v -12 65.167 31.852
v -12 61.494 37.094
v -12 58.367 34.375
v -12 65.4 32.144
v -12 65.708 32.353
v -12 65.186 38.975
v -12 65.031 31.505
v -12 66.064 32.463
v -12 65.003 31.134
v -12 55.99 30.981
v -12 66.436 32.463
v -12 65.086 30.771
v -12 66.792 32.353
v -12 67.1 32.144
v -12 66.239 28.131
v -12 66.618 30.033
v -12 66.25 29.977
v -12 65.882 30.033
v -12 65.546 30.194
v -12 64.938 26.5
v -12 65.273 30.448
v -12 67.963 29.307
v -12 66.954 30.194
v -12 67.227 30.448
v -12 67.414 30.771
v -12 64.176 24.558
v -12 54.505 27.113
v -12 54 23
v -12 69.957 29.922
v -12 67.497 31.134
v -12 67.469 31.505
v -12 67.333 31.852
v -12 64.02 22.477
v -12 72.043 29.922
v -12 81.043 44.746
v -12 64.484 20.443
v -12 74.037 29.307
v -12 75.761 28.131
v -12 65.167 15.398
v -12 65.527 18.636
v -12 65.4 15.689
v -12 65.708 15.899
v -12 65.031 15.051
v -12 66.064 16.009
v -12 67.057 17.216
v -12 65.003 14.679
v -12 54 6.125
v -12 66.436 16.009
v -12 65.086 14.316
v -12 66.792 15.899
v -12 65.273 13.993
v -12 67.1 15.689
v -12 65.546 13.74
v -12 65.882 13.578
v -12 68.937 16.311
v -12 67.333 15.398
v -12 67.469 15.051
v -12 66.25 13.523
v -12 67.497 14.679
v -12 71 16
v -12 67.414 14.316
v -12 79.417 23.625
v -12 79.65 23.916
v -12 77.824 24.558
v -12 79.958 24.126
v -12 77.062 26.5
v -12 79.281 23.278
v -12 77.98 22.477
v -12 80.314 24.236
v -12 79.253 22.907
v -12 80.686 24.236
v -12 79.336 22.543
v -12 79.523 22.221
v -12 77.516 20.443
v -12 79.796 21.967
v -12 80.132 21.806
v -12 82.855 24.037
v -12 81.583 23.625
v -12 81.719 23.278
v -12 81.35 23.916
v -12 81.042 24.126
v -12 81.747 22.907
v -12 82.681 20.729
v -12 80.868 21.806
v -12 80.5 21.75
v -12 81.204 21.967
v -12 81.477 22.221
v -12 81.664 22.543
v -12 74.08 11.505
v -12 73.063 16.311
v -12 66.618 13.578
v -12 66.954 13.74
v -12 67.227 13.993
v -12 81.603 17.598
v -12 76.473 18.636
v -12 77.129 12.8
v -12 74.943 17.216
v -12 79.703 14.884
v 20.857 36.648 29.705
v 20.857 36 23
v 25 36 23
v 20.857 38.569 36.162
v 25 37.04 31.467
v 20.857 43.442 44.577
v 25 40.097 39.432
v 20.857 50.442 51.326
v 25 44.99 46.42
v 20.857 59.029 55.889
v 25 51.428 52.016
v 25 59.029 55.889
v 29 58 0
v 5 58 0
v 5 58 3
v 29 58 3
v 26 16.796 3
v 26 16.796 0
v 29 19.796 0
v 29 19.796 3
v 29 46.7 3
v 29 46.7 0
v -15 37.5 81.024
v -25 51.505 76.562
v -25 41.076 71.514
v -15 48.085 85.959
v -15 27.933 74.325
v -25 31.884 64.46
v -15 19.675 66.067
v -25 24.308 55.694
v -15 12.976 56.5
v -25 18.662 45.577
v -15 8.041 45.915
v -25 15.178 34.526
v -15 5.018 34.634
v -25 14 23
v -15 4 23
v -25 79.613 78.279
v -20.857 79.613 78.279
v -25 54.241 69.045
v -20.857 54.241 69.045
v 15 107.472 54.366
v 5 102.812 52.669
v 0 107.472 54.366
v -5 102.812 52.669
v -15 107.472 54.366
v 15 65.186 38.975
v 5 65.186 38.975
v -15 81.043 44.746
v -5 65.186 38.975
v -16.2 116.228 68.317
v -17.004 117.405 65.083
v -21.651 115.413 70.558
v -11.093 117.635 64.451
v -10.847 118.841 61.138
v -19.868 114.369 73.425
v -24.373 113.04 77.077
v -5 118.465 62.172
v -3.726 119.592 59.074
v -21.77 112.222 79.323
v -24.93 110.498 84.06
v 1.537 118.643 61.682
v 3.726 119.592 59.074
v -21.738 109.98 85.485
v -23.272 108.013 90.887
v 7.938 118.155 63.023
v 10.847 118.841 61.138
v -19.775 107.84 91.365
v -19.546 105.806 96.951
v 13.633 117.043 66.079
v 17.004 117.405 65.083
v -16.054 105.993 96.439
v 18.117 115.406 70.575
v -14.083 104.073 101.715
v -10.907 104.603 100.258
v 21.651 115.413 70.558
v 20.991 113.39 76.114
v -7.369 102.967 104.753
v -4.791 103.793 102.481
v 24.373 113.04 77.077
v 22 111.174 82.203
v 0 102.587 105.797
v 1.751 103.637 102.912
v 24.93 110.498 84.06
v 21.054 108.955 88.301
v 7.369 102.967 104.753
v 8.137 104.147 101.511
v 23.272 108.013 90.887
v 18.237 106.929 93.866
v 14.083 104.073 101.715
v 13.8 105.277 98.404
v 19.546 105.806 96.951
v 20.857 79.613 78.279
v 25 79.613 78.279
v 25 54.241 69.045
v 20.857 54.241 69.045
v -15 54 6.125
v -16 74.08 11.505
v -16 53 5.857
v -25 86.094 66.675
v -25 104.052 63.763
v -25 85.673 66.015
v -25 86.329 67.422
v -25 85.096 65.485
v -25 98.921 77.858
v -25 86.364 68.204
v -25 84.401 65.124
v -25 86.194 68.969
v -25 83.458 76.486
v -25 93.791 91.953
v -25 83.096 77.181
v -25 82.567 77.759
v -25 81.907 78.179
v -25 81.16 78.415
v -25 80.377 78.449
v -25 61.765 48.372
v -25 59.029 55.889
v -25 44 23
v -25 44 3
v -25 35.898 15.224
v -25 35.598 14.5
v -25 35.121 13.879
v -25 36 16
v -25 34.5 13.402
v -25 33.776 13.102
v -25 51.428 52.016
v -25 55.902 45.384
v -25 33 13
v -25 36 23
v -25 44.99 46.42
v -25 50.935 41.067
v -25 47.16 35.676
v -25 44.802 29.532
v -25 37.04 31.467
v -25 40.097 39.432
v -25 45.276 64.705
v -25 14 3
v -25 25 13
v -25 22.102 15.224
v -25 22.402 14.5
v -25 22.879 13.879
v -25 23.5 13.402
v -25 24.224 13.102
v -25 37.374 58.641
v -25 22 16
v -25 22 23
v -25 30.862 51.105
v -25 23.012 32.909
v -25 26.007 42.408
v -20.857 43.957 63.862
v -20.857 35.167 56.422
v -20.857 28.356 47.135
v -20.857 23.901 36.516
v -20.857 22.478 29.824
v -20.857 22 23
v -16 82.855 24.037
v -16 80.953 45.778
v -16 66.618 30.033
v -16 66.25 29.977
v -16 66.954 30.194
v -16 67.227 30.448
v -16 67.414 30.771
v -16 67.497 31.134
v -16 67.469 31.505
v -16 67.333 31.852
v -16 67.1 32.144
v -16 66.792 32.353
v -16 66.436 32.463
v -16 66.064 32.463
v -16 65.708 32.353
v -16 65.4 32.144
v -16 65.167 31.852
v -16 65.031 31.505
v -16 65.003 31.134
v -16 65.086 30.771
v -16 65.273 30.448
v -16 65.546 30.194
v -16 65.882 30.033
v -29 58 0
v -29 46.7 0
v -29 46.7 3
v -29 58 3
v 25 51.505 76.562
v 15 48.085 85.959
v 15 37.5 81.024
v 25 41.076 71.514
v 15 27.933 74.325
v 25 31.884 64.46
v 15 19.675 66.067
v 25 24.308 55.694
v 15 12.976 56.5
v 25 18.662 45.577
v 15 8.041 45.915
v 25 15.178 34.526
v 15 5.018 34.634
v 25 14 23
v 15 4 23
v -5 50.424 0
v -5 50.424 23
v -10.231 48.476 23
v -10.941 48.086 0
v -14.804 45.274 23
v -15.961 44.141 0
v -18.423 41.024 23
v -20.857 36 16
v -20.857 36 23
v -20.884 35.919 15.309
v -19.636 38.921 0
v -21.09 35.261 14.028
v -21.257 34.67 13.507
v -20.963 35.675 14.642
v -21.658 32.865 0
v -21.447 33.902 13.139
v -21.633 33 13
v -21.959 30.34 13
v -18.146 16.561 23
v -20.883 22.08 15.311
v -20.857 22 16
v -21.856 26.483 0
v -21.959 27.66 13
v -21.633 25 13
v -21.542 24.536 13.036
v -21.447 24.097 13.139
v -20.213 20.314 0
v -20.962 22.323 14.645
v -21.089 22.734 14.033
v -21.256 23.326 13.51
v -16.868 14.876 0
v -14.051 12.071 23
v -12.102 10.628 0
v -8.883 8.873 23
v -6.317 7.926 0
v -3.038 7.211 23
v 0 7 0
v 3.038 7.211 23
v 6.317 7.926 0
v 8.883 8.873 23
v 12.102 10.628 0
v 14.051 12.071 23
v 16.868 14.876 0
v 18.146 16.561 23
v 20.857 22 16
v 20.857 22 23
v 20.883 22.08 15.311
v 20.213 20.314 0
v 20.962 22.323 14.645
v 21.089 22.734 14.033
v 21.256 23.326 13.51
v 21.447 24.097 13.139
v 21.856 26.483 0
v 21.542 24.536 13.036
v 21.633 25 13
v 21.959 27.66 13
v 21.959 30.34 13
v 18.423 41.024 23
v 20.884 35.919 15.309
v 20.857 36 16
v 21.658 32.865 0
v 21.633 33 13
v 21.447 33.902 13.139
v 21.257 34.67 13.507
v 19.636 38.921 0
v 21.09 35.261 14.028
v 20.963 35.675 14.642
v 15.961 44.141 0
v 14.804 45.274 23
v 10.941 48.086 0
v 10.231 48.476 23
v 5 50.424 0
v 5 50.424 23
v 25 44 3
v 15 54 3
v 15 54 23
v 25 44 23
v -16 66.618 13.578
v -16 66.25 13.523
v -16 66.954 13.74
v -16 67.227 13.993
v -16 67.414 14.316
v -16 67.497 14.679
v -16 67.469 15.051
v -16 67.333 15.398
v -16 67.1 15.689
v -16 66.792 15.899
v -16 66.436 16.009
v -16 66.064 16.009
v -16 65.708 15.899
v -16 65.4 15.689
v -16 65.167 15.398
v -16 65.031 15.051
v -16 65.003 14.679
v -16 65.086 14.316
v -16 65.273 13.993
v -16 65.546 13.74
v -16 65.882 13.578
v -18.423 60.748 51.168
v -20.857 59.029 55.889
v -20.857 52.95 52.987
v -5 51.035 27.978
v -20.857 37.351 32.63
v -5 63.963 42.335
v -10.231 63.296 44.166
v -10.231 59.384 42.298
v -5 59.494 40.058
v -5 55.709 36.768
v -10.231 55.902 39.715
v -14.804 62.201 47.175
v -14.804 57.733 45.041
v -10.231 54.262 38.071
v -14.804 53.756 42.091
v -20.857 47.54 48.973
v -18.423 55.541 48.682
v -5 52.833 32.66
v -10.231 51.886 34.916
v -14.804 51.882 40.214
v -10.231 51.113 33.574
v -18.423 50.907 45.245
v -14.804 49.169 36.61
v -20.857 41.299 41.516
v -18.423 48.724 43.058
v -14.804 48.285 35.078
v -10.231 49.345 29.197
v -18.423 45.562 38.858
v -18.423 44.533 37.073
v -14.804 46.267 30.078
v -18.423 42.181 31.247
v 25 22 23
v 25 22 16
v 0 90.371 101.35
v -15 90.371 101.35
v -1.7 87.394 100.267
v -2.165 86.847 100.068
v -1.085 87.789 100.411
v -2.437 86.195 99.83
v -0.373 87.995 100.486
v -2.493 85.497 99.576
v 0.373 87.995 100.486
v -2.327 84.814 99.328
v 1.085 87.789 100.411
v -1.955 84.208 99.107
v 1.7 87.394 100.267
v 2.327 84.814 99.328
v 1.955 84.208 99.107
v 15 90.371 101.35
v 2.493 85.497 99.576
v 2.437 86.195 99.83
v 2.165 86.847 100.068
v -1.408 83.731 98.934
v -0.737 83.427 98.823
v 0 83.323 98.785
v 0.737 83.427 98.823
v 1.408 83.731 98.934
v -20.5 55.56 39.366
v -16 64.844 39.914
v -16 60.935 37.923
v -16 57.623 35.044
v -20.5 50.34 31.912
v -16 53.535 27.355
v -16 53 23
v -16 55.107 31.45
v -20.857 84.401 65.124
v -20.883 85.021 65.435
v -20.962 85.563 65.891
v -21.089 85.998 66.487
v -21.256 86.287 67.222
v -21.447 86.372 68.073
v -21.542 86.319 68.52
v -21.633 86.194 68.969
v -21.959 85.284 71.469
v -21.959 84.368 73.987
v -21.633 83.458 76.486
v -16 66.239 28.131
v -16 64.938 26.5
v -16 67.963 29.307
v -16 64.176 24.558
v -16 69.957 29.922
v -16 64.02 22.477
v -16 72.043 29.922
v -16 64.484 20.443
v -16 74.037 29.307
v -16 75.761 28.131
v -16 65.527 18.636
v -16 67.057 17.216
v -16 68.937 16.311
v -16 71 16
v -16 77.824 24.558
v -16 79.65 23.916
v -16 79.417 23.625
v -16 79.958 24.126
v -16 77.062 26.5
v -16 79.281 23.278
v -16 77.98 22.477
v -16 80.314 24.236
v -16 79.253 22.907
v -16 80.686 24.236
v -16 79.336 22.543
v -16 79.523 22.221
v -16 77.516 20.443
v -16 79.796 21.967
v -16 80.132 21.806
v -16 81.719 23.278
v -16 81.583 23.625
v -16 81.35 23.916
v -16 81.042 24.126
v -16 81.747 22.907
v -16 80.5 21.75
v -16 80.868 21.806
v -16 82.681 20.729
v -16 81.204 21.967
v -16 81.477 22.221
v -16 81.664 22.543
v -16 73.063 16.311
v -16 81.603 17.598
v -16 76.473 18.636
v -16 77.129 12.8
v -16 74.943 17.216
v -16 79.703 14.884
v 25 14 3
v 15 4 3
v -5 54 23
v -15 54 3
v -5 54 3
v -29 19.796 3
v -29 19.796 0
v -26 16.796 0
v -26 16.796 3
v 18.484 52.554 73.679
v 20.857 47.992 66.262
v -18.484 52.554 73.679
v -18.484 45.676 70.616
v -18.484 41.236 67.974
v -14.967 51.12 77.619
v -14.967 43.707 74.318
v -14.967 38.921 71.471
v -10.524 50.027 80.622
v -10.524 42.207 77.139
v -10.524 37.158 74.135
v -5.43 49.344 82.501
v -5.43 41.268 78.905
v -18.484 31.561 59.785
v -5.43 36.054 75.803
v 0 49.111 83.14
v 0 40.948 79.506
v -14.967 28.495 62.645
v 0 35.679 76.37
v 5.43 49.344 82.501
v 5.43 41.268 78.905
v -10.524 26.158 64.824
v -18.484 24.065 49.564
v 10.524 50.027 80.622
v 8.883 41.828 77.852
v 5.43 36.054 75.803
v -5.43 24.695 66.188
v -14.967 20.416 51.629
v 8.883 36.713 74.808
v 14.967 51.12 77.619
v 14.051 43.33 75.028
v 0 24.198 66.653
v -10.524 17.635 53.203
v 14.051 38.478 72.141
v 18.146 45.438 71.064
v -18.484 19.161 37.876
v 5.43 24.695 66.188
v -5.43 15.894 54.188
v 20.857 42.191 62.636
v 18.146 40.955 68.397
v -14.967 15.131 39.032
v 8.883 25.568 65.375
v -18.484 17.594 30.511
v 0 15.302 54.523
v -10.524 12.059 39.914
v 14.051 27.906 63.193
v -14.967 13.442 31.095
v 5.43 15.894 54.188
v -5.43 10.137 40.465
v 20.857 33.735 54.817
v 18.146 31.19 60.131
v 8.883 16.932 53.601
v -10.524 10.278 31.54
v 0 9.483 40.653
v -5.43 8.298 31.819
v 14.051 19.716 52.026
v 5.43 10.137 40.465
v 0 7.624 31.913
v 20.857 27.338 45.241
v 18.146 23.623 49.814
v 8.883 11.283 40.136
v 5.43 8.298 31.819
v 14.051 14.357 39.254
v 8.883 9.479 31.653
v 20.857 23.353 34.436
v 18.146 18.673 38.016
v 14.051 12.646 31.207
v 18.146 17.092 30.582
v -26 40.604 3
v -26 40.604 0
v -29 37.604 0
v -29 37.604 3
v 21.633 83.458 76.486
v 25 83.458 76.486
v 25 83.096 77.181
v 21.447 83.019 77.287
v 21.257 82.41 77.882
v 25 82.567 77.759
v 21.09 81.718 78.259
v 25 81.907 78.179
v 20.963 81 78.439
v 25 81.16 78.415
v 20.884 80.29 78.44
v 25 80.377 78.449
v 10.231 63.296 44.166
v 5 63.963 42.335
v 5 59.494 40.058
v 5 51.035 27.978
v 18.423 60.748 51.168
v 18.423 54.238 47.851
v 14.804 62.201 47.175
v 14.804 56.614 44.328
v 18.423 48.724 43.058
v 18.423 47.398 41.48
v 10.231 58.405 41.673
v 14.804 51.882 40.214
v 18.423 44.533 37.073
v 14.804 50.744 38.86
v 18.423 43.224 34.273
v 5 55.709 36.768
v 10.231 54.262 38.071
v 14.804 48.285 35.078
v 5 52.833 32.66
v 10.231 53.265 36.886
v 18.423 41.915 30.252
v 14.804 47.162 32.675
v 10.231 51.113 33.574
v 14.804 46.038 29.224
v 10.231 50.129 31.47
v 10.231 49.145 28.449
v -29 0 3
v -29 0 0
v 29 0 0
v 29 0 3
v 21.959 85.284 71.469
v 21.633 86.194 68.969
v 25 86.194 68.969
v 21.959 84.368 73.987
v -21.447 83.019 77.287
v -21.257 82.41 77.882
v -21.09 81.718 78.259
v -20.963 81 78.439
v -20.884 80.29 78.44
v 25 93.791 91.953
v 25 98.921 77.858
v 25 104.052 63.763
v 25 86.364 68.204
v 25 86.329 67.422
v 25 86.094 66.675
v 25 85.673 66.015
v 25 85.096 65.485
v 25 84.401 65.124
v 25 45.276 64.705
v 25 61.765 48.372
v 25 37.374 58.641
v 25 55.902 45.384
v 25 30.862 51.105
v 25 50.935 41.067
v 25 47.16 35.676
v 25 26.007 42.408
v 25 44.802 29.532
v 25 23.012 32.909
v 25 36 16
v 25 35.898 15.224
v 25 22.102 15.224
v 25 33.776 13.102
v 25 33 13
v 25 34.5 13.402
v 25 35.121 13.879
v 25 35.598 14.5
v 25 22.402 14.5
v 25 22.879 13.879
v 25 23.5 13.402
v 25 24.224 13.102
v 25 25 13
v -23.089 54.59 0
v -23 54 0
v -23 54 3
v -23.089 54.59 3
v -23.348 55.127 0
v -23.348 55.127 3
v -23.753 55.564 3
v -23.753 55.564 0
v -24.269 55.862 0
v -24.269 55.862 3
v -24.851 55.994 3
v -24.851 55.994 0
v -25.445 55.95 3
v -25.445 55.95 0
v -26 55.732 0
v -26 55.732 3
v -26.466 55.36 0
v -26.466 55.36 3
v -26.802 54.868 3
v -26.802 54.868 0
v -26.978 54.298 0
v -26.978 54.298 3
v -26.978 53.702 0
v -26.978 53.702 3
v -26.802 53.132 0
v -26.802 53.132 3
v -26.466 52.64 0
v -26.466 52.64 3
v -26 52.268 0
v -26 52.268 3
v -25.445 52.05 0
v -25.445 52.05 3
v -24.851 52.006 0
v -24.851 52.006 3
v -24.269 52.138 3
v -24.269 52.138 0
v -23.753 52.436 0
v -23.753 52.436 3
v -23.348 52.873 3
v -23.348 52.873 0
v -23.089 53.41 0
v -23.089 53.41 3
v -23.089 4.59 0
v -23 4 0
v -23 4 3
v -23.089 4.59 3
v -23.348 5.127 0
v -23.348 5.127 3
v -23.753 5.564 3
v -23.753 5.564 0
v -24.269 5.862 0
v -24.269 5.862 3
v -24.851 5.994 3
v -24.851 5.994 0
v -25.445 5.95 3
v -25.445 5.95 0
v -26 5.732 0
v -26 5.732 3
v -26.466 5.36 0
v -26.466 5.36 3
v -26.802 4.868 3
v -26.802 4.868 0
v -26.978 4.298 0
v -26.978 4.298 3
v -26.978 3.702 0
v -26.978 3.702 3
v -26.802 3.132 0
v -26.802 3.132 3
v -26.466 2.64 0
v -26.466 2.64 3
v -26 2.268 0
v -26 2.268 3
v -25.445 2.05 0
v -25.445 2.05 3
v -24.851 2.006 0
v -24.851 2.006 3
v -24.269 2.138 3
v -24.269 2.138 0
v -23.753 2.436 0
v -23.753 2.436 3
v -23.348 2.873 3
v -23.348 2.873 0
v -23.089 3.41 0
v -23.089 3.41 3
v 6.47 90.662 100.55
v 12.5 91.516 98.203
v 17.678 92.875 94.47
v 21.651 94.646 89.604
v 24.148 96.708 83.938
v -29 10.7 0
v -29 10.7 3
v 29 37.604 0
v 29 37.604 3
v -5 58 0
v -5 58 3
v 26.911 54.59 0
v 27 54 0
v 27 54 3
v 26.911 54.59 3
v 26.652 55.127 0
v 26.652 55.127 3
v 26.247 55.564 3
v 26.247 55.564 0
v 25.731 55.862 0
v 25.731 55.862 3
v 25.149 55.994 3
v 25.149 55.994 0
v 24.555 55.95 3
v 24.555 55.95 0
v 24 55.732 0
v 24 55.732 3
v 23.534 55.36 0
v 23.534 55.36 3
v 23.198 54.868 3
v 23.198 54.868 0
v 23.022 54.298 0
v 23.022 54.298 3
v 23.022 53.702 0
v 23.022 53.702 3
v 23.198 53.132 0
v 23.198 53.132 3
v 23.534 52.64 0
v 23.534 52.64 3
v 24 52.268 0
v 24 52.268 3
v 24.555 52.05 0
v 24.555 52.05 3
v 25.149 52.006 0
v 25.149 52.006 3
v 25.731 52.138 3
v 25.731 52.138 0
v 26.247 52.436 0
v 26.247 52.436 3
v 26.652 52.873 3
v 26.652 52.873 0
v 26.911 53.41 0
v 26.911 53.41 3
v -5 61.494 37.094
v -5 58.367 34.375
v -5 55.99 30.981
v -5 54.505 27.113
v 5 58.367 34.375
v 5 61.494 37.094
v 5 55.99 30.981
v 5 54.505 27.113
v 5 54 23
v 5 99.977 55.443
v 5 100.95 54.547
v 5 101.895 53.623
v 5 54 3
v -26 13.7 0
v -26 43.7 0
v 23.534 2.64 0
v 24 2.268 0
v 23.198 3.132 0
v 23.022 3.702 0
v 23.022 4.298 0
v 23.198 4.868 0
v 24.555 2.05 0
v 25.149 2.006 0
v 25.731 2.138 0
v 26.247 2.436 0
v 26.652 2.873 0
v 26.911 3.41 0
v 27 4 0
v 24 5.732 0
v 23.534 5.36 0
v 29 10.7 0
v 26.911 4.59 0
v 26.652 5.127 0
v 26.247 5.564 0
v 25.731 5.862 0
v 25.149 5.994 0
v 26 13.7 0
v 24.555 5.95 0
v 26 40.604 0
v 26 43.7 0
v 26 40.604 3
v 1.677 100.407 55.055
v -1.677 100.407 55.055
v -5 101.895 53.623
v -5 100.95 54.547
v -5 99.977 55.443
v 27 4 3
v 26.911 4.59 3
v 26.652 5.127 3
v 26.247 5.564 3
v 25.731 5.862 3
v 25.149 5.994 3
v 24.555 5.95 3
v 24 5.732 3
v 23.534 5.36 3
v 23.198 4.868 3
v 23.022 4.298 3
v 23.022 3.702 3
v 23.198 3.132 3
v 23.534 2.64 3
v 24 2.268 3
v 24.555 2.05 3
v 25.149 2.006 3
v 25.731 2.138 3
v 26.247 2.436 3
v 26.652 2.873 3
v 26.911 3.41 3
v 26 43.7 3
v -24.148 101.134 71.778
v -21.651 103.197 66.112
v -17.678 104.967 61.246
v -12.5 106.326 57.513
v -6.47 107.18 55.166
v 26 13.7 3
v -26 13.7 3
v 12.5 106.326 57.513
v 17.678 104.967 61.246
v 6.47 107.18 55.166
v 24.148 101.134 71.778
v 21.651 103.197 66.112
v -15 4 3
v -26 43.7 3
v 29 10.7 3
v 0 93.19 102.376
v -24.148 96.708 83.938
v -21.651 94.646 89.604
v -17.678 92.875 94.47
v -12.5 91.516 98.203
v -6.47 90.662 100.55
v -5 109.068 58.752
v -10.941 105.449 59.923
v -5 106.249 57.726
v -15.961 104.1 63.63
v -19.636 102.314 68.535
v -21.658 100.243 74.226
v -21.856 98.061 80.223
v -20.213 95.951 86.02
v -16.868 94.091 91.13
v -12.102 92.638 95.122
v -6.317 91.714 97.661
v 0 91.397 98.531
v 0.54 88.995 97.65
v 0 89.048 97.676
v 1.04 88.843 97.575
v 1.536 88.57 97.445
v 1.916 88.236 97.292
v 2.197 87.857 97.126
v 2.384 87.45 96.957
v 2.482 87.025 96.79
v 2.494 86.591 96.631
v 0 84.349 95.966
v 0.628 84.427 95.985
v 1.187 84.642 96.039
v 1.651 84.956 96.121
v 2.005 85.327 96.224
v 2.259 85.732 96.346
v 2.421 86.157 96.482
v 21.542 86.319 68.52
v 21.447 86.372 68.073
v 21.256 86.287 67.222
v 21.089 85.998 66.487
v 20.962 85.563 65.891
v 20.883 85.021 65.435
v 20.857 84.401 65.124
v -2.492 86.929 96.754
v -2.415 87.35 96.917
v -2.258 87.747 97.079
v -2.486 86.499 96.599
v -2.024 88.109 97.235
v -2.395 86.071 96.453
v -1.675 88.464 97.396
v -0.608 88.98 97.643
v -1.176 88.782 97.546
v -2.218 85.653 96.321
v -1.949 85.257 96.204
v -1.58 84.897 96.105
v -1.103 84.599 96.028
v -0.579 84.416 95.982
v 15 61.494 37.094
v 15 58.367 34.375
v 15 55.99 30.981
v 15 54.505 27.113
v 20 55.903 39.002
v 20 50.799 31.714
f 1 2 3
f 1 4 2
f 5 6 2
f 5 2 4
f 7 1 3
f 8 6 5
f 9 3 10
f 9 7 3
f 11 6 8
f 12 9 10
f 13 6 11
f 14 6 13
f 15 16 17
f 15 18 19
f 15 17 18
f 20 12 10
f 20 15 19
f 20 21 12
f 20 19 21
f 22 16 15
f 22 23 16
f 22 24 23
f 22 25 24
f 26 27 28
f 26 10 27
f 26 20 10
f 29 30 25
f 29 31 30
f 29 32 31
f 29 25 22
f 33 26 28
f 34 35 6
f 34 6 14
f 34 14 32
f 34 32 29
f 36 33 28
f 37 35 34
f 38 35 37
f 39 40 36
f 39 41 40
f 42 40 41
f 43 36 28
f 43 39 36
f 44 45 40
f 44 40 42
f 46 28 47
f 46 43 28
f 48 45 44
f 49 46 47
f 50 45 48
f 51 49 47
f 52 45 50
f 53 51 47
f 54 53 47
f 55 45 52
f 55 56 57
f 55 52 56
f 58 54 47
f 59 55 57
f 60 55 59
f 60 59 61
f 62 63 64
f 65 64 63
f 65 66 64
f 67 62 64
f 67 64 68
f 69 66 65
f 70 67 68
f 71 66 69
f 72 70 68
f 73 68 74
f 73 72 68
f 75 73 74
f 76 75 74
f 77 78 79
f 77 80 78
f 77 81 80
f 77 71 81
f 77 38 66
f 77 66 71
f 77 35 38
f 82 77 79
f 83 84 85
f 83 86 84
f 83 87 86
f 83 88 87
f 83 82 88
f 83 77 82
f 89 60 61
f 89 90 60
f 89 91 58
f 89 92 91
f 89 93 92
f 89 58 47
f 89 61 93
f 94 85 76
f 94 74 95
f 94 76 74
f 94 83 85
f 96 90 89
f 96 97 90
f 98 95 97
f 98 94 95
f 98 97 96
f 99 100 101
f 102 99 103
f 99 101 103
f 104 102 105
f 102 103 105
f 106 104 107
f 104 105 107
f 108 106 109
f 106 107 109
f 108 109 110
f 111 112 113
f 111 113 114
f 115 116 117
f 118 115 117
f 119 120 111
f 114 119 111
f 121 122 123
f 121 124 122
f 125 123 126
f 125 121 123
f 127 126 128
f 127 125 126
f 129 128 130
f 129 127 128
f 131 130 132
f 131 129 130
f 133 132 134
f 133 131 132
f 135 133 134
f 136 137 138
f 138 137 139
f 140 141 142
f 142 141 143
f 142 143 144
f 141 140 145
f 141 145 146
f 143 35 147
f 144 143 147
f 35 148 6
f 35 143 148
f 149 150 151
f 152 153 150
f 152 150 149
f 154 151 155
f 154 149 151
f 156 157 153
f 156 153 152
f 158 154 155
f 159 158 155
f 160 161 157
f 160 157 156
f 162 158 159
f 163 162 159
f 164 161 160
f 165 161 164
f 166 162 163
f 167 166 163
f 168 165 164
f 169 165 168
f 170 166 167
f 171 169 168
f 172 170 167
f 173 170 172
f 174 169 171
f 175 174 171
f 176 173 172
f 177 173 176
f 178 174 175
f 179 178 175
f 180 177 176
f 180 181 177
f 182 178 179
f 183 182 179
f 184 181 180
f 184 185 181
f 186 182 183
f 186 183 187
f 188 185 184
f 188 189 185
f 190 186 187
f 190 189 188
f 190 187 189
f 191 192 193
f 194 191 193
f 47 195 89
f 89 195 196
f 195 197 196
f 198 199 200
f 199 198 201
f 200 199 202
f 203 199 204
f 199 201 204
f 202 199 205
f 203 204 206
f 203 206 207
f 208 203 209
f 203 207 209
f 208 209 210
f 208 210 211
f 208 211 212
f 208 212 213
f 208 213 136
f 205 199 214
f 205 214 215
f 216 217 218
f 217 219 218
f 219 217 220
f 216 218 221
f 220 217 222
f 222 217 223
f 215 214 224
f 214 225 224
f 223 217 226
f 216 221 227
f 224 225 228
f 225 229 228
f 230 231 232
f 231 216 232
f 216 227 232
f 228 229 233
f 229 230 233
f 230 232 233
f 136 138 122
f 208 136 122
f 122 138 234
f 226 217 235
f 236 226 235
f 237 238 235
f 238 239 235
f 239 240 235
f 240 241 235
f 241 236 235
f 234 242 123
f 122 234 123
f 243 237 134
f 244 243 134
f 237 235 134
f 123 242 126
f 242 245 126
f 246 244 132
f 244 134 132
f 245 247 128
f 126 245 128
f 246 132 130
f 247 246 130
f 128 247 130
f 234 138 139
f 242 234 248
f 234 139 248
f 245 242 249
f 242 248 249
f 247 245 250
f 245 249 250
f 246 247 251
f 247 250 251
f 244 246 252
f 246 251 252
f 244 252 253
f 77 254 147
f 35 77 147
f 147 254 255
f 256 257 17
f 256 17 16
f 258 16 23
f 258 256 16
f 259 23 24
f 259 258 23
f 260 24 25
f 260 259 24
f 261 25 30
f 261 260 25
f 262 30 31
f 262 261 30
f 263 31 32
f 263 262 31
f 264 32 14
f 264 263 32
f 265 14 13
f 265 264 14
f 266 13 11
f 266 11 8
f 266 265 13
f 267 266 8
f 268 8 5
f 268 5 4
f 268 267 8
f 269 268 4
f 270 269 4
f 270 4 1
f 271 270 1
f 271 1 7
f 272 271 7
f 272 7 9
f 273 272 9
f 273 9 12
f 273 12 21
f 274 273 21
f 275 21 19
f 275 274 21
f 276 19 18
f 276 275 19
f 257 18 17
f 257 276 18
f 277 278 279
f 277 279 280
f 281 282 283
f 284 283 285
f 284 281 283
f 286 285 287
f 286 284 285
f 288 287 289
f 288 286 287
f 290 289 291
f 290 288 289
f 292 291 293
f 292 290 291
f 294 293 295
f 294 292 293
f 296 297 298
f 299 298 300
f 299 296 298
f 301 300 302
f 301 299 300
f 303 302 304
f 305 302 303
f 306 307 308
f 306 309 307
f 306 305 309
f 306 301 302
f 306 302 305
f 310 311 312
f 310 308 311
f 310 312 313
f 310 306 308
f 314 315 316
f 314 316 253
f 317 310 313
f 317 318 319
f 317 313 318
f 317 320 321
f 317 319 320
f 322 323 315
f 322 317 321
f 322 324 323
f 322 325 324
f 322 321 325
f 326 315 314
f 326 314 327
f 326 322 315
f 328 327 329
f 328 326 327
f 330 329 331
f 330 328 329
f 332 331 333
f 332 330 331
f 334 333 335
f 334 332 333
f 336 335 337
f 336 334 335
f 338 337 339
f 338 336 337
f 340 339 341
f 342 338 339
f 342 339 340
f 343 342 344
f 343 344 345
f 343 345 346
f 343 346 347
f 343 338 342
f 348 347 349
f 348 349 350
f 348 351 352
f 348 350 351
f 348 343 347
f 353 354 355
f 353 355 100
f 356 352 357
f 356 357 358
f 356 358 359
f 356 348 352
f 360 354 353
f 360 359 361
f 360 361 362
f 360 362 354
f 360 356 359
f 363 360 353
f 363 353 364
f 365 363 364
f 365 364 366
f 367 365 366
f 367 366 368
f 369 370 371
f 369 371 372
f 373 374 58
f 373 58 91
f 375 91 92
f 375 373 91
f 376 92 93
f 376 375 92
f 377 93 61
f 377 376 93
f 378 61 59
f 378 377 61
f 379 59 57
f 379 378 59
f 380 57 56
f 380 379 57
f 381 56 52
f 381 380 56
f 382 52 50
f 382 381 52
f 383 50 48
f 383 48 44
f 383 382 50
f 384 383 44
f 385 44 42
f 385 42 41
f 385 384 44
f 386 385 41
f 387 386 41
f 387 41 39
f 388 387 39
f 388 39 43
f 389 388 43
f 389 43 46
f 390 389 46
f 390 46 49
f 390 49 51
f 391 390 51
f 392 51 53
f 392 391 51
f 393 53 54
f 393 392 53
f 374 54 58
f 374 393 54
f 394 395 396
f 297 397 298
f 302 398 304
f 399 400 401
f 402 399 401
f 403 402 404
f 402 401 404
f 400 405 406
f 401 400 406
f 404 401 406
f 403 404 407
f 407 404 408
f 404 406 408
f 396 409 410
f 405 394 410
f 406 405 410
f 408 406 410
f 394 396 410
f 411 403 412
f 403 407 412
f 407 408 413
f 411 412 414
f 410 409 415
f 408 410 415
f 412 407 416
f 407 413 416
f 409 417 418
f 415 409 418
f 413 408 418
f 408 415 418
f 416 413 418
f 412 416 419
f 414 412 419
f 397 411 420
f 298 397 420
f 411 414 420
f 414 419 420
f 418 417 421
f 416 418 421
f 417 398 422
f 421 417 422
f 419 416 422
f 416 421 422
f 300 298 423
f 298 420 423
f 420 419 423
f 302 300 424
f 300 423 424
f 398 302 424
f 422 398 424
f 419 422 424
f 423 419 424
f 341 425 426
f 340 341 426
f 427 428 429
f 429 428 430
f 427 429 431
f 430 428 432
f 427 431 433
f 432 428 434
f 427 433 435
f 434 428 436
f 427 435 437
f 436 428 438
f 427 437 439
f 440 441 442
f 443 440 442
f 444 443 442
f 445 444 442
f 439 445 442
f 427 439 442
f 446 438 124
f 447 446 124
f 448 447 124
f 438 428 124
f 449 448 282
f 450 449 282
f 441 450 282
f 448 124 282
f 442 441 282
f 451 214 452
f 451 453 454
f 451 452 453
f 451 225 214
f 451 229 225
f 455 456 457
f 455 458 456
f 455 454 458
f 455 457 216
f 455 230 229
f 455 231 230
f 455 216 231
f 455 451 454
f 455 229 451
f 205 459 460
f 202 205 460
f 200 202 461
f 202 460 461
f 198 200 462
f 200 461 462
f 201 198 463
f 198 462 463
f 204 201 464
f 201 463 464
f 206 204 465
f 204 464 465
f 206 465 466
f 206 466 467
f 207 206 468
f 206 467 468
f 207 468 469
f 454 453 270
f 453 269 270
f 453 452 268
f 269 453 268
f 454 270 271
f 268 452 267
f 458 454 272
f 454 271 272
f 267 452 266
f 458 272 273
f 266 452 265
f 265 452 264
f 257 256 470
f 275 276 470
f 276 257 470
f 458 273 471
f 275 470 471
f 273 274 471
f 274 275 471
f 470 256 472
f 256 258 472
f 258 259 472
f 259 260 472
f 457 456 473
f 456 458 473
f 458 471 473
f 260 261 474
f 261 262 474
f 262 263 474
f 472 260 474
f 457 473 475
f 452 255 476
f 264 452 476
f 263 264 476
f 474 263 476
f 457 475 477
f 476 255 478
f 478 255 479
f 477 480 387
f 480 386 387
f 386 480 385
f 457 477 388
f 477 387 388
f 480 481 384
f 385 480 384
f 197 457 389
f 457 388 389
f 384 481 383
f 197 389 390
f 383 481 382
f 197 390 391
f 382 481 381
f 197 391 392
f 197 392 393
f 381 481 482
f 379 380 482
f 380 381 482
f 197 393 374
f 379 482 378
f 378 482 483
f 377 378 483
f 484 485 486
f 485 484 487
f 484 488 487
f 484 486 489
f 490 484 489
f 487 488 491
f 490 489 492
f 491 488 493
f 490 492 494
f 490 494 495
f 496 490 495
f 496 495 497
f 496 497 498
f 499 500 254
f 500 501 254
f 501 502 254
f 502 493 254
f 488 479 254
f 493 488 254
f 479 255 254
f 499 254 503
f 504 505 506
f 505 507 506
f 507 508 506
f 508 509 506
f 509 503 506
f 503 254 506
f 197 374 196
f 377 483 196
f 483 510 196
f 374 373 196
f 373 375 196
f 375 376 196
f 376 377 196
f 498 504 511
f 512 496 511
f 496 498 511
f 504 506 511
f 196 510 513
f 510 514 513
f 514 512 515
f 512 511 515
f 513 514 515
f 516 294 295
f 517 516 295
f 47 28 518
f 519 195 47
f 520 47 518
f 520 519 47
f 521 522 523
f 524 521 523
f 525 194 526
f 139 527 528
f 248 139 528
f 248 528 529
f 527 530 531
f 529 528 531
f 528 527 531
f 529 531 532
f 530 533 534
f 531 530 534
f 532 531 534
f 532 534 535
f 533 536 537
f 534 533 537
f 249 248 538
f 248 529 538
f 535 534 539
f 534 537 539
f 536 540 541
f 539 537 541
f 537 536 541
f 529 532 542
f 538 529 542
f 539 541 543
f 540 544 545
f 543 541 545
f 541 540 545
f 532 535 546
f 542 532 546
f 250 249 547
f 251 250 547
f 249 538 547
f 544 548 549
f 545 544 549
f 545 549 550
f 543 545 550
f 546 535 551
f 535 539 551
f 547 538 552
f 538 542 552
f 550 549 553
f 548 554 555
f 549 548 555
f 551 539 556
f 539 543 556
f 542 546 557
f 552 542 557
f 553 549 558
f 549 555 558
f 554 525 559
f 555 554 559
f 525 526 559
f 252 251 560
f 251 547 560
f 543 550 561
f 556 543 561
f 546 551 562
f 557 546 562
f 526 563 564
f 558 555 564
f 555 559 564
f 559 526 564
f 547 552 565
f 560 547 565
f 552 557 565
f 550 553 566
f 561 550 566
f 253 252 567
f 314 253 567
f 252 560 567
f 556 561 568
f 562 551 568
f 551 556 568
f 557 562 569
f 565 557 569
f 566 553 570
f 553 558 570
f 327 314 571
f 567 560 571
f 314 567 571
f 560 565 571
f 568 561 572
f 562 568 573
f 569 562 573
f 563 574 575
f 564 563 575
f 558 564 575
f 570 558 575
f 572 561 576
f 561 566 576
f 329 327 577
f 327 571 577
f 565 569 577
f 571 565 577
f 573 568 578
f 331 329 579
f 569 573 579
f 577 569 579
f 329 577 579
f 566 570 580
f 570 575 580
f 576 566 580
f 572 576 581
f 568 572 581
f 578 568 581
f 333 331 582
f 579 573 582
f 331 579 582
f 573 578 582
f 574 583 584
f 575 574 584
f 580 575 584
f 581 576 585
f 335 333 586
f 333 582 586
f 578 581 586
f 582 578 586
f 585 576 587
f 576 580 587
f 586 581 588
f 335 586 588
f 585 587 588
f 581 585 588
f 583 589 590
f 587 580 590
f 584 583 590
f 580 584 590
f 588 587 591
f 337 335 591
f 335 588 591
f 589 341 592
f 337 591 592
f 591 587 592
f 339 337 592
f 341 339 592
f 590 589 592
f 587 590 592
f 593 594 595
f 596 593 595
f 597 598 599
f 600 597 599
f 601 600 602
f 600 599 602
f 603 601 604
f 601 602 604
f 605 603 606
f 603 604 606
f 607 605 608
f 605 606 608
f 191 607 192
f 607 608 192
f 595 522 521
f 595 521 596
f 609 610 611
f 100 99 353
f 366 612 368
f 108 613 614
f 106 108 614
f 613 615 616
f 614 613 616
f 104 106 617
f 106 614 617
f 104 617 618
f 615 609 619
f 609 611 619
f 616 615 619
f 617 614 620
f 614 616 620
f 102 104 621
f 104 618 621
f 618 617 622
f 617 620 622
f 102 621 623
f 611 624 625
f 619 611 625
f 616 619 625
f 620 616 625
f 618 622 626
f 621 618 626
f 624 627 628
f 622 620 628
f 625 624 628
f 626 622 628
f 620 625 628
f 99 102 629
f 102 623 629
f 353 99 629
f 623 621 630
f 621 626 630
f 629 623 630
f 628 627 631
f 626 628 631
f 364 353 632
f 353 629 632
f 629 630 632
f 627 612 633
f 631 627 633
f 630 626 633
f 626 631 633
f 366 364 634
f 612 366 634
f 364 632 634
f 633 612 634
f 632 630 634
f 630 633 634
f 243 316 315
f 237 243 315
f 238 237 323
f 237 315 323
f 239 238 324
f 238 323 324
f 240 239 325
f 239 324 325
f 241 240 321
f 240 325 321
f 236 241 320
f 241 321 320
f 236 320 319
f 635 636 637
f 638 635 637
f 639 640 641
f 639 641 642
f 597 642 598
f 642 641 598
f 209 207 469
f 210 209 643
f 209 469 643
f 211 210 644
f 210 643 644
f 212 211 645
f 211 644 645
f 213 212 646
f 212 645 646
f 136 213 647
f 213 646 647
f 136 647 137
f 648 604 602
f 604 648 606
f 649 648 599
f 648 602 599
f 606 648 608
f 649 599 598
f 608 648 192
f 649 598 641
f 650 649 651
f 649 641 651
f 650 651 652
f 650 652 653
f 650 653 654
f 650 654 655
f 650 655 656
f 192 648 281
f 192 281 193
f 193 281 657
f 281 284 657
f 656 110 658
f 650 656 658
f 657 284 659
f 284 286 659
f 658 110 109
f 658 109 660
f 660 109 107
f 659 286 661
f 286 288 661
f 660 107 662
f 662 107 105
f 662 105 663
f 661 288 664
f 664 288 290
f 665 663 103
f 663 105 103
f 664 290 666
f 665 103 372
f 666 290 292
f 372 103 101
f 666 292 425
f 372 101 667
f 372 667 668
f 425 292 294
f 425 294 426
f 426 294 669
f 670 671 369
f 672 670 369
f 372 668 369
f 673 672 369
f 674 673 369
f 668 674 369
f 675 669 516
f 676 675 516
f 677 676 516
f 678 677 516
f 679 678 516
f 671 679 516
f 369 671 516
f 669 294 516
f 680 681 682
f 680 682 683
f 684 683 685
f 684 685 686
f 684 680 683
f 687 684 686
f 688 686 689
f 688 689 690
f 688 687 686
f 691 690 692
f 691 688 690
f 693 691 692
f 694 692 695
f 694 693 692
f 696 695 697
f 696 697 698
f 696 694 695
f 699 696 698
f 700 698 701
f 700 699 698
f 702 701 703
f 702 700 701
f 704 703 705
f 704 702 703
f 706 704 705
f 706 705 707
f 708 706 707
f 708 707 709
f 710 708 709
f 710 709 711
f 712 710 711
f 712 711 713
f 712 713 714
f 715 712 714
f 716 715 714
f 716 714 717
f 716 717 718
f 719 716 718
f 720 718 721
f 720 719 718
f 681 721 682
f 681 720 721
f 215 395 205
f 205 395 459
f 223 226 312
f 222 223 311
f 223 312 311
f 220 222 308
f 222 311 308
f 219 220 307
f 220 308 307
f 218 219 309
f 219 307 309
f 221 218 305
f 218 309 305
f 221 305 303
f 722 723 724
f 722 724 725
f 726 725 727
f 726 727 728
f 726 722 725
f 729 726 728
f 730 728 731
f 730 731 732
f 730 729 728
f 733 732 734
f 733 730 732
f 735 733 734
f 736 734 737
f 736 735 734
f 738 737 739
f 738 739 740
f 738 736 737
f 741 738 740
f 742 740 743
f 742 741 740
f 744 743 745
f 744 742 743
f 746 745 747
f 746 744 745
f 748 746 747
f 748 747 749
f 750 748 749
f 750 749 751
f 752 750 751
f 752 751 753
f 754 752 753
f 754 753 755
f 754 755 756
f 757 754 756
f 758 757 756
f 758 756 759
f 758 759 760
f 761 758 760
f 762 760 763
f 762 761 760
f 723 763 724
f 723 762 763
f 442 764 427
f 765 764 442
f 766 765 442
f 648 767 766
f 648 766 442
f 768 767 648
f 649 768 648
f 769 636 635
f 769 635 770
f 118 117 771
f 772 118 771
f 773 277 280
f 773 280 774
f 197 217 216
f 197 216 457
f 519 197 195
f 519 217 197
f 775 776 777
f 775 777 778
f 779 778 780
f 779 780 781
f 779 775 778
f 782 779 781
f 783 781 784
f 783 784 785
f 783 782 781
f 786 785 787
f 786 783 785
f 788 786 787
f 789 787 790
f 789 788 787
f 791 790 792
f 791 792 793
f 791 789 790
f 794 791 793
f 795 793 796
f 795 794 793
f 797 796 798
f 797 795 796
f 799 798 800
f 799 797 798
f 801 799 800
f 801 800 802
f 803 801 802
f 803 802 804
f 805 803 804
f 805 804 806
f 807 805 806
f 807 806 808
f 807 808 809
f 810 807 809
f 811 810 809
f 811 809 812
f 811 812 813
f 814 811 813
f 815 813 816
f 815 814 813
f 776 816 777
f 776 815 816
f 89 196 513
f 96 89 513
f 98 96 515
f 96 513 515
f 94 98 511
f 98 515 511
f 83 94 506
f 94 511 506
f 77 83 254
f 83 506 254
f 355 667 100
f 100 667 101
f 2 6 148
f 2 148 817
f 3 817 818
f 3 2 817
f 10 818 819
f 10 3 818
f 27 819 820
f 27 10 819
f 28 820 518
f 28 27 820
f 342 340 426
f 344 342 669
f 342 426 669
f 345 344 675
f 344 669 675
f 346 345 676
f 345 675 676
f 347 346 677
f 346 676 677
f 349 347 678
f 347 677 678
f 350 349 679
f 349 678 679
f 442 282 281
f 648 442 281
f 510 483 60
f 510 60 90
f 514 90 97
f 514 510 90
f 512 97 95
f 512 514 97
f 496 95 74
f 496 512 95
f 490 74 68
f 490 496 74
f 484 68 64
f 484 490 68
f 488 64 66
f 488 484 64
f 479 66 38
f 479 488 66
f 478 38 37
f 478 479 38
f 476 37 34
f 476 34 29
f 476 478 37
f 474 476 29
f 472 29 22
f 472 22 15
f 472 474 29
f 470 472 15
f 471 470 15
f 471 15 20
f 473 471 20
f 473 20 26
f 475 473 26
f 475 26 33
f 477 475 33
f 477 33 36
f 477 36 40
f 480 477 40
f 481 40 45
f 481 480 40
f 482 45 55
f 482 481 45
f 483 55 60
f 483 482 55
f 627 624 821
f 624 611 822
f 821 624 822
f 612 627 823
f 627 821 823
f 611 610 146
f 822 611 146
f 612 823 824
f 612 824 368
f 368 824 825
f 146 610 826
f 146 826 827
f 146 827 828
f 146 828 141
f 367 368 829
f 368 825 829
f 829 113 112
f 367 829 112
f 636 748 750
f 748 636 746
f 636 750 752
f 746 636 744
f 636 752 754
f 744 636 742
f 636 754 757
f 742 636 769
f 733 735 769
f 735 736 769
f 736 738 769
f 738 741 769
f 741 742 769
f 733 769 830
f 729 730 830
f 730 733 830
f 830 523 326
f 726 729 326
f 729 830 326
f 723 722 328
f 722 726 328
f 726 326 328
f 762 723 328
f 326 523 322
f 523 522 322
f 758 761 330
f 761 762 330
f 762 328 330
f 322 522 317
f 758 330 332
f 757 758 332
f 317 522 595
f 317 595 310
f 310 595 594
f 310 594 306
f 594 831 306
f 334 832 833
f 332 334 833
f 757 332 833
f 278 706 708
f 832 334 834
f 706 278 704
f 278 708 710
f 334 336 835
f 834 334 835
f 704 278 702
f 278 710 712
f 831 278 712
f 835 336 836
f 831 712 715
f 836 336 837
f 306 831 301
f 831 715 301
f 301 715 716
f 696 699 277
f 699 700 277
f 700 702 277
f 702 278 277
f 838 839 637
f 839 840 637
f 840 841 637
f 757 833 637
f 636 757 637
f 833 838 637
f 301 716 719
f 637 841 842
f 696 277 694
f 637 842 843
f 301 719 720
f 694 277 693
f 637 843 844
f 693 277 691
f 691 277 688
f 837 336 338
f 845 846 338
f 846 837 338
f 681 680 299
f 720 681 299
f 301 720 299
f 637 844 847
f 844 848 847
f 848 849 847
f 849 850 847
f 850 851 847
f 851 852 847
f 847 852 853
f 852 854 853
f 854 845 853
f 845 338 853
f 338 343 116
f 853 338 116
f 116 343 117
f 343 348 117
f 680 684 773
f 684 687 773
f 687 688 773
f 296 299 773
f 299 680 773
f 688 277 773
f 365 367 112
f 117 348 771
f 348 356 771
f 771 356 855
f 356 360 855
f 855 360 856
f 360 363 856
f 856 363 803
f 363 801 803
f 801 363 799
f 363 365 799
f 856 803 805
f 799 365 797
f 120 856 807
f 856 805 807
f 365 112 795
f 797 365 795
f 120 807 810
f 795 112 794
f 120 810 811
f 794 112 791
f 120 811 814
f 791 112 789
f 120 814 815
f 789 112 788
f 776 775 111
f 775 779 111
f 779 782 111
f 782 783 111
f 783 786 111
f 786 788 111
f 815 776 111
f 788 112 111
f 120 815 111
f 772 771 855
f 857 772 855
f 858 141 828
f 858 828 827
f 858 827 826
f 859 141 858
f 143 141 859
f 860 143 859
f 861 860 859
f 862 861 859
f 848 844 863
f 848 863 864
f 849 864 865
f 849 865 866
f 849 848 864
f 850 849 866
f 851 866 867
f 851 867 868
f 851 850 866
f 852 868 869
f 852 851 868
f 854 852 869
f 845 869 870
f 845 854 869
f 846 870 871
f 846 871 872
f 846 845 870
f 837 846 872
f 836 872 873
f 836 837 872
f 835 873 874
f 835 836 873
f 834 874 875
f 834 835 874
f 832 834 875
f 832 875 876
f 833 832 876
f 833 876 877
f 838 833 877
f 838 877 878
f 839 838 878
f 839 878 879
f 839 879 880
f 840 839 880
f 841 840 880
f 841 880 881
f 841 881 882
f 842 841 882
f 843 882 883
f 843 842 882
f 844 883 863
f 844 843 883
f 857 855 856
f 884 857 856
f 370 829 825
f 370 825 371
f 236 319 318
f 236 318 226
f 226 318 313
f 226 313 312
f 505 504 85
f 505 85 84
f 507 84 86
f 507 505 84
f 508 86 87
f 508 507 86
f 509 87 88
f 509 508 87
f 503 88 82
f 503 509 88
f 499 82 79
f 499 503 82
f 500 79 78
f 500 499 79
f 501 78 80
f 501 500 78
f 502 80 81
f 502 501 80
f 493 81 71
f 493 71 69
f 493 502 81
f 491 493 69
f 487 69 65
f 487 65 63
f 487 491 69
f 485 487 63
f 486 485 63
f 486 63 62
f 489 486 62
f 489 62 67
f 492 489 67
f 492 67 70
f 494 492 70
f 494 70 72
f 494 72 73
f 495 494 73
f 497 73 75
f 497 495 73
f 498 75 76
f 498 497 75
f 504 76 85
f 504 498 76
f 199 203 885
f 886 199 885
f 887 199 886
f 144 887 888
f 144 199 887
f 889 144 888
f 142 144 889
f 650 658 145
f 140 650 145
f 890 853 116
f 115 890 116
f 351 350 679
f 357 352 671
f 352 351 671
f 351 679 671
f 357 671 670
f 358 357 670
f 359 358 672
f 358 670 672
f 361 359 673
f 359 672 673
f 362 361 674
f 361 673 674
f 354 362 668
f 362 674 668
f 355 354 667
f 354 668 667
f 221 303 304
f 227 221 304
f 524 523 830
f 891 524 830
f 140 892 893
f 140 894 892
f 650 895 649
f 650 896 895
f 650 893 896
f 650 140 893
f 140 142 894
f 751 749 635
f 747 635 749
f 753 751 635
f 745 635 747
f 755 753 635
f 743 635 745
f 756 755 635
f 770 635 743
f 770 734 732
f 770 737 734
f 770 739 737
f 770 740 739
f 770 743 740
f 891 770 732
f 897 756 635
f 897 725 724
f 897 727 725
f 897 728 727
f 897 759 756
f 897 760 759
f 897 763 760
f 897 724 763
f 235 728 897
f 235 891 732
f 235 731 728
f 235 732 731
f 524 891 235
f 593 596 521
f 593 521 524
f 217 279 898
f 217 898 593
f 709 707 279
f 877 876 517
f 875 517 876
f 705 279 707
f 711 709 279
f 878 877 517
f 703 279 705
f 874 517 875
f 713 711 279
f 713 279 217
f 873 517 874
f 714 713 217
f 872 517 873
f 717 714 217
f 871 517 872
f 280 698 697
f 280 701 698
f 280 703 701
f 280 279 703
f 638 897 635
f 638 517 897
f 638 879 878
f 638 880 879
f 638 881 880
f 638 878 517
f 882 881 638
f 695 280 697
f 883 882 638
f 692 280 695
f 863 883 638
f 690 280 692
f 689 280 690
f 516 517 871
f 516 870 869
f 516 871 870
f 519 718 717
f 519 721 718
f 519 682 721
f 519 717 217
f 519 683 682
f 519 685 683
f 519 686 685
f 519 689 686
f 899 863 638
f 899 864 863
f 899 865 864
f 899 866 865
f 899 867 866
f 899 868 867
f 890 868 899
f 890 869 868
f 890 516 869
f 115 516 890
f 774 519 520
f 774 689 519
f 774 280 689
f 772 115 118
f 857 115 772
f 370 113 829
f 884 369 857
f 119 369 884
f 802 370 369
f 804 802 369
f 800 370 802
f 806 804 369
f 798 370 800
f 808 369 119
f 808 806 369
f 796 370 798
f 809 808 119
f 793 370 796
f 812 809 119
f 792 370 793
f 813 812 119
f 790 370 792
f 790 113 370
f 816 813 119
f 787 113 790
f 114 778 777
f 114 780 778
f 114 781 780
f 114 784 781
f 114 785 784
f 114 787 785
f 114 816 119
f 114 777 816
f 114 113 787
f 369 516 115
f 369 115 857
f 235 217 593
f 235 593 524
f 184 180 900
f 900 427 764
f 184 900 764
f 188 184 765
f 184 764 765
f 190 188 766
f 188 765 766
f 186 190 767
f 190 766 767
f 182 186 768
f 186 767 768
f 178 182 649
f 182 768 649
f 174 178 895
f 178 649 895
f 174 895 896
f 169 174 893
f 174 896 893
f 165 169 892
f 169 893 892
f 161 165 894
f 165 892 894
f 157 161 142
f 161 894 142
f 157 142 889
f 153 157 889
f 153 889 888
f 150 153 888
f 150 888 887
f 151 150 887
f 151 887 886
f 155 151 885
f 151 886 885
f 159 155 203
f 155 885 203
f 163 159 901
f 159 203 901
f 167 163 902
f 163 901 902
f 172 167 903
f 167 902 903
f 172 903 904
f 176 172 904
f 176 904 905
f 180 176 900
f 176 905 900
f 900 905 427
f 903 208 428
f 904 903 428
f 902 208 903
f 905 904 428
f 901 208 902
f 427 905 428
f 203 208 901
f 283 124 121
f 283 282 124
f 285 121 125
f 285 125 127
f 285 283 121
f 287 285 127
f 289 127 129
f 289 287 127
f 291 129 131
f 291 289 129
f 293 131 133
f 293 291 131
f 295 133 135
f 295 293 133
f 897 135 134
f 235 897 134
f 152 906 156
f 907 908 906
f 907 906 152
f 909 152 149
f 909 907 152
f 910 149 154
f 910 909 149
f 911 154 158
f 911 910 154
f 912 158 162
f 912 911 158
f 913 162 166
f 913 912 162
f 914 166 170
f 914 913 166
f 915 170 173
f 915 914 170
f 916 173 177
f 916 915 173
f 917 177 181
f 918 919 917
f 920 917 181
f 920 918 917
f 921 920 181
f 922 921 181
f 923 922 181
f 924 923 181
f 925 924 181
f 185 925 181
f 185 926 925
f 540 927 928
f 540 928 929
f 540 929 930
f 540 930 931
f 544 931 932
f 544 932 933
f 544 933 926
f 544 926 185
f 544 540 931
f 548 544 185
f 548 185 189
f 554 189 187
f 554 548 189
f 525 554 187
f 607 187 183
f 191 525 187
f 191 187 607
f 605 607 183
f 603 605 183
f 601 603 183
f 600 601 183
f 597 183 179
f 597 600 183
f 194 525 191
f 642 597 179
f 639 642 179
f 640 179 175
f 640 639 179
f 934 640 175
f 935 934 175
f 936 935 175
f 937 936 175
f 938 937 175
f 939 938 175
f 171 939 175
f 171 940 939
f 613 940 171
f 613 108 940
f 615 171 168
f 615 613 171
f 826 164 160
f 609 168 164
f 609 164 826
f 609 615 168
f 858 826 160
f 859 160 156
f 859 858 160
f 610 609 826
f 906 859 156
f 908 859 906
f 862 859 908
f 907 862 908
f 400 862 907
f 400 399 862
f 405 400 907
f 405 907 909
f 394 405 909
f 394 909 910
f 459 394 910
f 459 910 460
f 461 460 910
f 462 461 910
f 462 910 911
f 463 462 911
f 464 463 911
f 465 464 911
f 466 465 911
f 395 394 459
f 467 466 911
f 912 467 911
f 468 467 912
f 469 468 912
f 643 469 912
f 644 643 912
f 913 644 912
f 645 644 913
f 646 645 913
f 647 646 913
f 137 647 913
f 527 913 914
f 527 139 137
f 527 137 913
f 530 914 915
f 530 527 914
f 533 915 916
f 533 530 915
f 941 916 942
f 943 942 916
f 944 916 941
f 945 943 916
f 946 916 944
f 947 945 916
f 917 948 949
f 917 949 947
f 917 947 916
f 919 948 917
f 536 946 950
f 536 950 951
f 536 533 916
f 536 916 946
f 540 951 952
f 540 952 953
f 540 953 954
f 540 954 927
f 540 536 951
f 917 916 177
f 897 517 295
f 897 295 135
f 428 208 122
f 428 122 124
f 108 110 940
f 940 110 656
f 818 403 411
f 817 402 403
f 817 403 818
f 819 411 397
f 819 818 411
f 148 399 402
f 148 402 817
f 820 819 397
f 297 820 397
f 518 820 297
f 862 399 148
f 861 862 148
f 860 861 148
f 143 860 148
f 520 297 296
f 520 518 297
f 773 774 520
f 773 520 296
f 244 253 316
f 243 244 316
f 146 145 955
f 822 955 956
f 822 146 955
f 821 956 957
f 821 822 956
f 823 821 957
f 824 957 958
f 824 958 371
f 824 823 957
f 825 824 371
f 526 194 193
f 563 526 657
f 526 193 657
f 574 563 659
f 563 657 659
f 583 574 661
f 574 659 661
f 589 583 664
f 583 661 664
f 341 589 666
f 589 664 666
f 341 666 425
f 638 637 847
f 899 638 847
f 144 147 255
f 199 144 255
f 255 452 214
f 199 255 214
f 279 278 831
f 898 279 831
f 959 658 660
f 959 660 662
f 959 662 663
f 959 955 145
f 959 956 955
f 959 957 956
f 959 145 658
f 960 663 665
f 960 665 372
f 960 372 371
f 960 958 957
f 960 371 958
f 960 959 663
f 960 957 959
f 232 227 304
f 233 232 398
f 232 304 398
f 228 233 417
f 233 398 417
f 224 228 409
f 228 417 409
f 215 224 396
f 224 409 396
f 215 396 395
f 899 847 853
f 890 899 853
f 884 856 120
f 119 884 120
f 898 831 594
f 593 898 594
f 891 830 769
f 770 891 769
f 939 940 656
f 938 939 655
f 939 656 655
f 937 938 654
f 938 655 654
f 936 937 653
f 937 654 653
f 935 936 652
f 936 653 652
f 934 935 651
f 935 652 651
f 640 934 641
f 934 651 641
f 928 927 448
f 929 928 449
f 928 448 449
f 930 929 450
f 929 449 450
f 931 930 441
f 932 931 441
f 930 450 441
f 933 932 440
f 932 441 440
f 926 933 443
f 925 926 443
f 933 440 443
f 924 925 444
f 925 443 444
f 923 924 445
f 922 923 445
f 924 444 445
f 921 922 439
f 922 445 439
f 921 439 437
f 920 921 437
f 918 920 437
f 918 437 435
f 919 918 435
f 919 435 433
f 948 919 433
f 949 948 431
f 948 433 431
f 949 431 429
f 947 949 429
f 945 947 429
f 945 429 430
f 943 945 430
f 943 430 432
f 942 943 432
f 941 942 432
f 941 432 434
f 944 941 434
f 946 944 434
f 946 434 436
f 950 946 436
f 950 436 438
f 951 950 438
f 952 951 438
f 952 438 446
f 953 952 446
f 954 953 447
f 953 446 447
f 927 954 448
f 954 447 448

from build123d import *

# Parameters (mm, degrees)
SKETCH_1_W               = 58
SKETCH_1_H               = 58
SKETCH_1_R               = 22
SKETCH_1_R_2             = 2
EXTRUDE_1_DEPTH          = 3
SKETCH_2_R               = 22
EXTRUDE_2_DEPTH          = 20
SKETCH_4_R               = 22
SKETCH_5_R               = 22
EXTRUDE_3_DEPTH          = 45
CUT_EXTRUDE_1_DEPTH      = 5
CUT_EXTRUDE_1_DEPTH_BACK = 5
SKETCH_6_R               = 43.5
SKETCH_11_R              = 25
SKETCH_11_R_2            = 22
EXTRUDE_7_DEPTH          = 3
SKETCH_12_R              = 25
SKETCH_12_R_2            = 22
EXTRUDE_8_DEPTH          = 10
SKETCH2_R                = 11.9
SKETCH2_R_2              = 7
SKETCH2_R_3              = 1.25
EXTRUDE1_DEPTH           = 4
CUT_EXTRUDE1_DEPTH       = 51
CUT_EXTRUDE2_DEPTH       = 3
SKETCH5_R                = 2.5
CUT_EXTRUDE3_DEPTH       = 10


with BuildPart() as part:
    # 草图1 → 凸台-拉伸1 (new body)
    with BuildSketch(Plane.XY):
        with Locations((0, 29)):
            Rectangle(SKETCH_1_W, SKETCH_1_H)
        with Locations((0, 29)):
            Circle(SKETCH_1_R, mode=Mode.SUBTRACT)
        with Locations((-25, 54)):
            Circle(SKETCH_1_R_2, mode=Mode.SUBTRACT)
        with Locations((25, 54)):
            Circle(SKETCH_1_R_2, mode=Mode.SUBTRACT)
        with Locations((25, 4)):
            Circle(SKETCH_1_R_2, mode=Mode.SUBTRACT)
        with Locations((-25, 4)):
            Circle(SKETCH_1_R_2, mode=Mode.SUBTRACT)
    extrude(amount=EXTRUDE_1_DEPTH)

    # 草图2 → 凸台-拉伸2 (add)
    with BuildSketch(Plane.XY.offset(3)):
        Polygon((-25, 44), (-15, 54), (15, 54), (25, 44), (25, 14), (15, 4), (-15, 4), (-25, 14), align=None)
        with Locations((0, 29)):
            Circle(SKETCH_2_R, mode=Mode.SUBTRACT)
    extrude(amount=EXTRUDE_2_DEPTH)

    # 扫描1: sweep along a path in 草图3
    with BuildLine(Plane(origin=(0, 0, 0), x_dir=(0, 0, -1), z_dir=(1, 0, 0))) as sweep_1_path:
        ThreePointArc((-62.467090073, 56.63515398), (-47.090210327, 36.59561414), (-23, 29))
    # 草图4 → 扫描1 (sweep)
    with BuildSketch(Plane.XY.offset(23)):
        Polygon((-25, 44), (-25, 14), (-15, 4), (15, 4), (25, 14), (25, 44), (15, 54), (-15, 54), align=None)
        with Locations((0, 29)):
            Circle(SKETCH_4_R, mode=Mode.SUBTRACT)
    sweep(path=sweep_1_path.line)

    # 草图5 → 凸台-拉伸3 (add)
    with BuildSketch(Plane(origin=(0, 70.086635242, 25.509449048), x_dir=(1, 0, 0), z_dir=(0, 0.9396926207859096, 0.34202014332566555))):
        Polygon((-15, -14.329500102), (-25, -24.329500102), (-25, -54.329500102), (-15, -64.329500102), (15, -64.329500102), (25, -54.329500102), (25, -24.329500102), (15, -14.329500102), align=None)
        with Locations(Location((0, -39.329500102, 0), (0, 0, 270))):
            Circle(SKETCH_5_R, mode=Mode.SUBTRACT)
    extrude(amount=EXTRUDE_3_DEPTH)

    # 草图6 → 切除-拉伸1 (cut, two sides: drawn at the far end of the back side and taken through both)
    with BuildSketch(Plane(origin=(0, 0, 0), x_dir=(0, 0, -1), z_dir=(1, 0, 0)).offset(-CUT_EXTRUDE_1_DEPTH_BACK)):
        with Locations((-23, 71)):
            Circle(SKETCH_6_R)
    extrude(amount=CUT_EXTRUDE_1_DEPTH + CUT_EXTRUDE_1_DEPTH_BACK, mode=Mode.SUBTRACT)

    # 草图11 → 凸台-拉伸7 (add)
    with BuildSketch(Plane(origin=(0, 112.372803177, 40.900355498), x_dir=(1, 0, 0), z_dir=(0, 0.9396926207859096, 0.3420201433256655))):
        with Locations(Location((0, -39.329500102, 0), (0, 0, 270))):
            Circle(SKETCH_11_R)
        with Locations(Location((0, -39.329500102, 0), (0, 0, 103.136558787))):
            Circle(SKETCH_11_R_2, mode=Mode.SUBTRACT)
    extrude(amount=EXTRUDE_7_DEPTH)

    # 草图12 → 凸台-拉伸8 (add)
    with BuildSketch(Plane(origin=(0, 115.19188104, 41.926415928), x_dir=(1, 0, 0), z_dir=(0, 0.9396926207859096, 0.34202014332566555))):
        with Locations(Location((0, -39.329500102, 0), (0, 0, 270))):
            Circle(SKETCH_12_R)
        with Locations(Location((0, -39.329500102, 0), (0, 0, 103.136558787))):
            Circle(SKETCH_12_R_2, mode=Mode.SUBTRACT)
    extrude(amount=EXTRUDE_8_DEPTH)

    # Sketch2 → Extrude1 (add)
    # profile 1 of 2: a face of its own
    with BuildSketch(Plane(origin=(-16, 0, 0), x_dir=(0, 0, -1), z_dir=(1, 0, 0))):
        with BuildLine():
            ThreePointArc((-11.1, 71), (-31.039523471, 62.226399692), (-24.037153339, 82.854716907))
            Line((-24.037153339, 82.854716907), (-46.297321767, 80.907204522))
            Line((-46.297321767, 80.907204522), (-37.464873971, 56.640253643))
            Line((-37.464873971, 56.640253643), (-28.143847274, 52.683572923))
            Line((-28.143847274, 52.683572923), (-5.77234161, 52.683572923))
            Line((-5.77234161, 52.683572923), (-11.505482667, 74.079946637))
            ThreePointArc((-11.505482667, 74.079946637), (-11.20180615, 72.553261687), (-11.1, 71))
        make_face()
    # profile 2 of 2: a face of its own
    with BuildSketch(Plane(origin=(-16, 0, 0), x_dir=(0, 0, -1), z_dir=(1, 0, 0))):
        with Locations((-23, 71)):
            Circle(SKETCH2_R)
        with Locations((-23, 71)):
            Circle(SKETCH2_R_2, mode=Mode.SUBTRACT)
        with Locations((-14.772758664, 66.25)):
            Circle(SKETCH2_R_3, mode=Mode.SUBTRACT)
        with Locations((-31.227241336, 66.25)):
            Circle(SKETCH2_R_3, mode=Mode.SUBTRACT)
        with Locations((-23, 80.5)):
            Circle(SKETCH2_R_3, mode=Mode.SUBTRACT)
    extrude(amount=EXTRUDE1_DEPTH)

    # Sketch3 → Cut-Extrude1 (cut)
    with BuildSketch(Plane(origin=(25, 0, 0), x_dir=(0, 0, -1), z_dir=(1, 0, 0))):
        with BuildLine():
            Line((-68.96892389, 86.194013177), (-76.486464856, 83.457852031))
            ThreePointArc((-76.486464856, 83.457852031), (-78.179327787, 81.906628953), (-78.279482288, 79.612713738))
            Line((-78.279482288, 79.612713738), (-69.044938419, 54.241012977))
            ThreePointArc((-69.044938419, 54.241012977), (-51.105245381, 30.86154983), (-23, 22))
            Line((-23, 22), (-16, 22))
            ThreePointArc((-16, 22), (-13.878679656, 22.878679656), (-13, 25))
            Line((-13, 25), (-13, 33))
            ThreePointArc((-13, 33), (-13.878679656, 35.121320344), (-16, 36))
            Line((-16, 36), (-23, 36))
            ThreePointArc((-23, 36), (-43.075175272, 42.32967845), (-55.889241728, 59.029294984))
            Line((-55.889241728, 59.029294984), (-65.123785597, 84.400995745))
            ThreePointArc((-65.123785597, 84.400995745), (-66.675008674, 86.093858676), (-68.96892389, 86.194013177))
        make_face()
    extrude(amount=-CUT_EXTRUDE1_DEPTH, mode=Mode.SUBTRACT)

    # Sketch4 → Cut-Extrude2 (cut)
    with BuildSketch(Plane(origin=(0, 0, 0), x_dir=(-1, 0, 0), z_dir=(0, 0, -1))):
        Polygon((-26, 16.795799061), (-29, 19.795799061), (-29, 10.7), (-26, 13.7), align=None)
        Polygon((-26, 43.7), (-29, 46.7), (-29, 37.604200939), (-26, 40.604200939), align=None)
        Polygon((26, 40.604200939), (29, 37.604200939), (29, 46.7), (26, 43.7), align=None)
        Polygon((29, 19.795799061), (26, 16.795799061), (26, 13.7), (29, 10.7), align=None)
    extrude(amount=-CUT_EXTRUDE2_DEPTH, mode=Mode.SUBTRACT)

    # Sketch5 → Cut-Extrude3 (cut)
    with BuildSketch(Plane(origin=(0, -22.001984845, 60.449956545), x_dir=(1, 0, 0), z_dir=(0, -0.3420201433256656, 0.9396926207859096))):
        with Locations(Location((0, 114.584639372, 0), (0, 0, 270))):
            Circle(SKETCH5_R)
    extrude(amount=-CUT_EXTRUDE3_DEPTH, mode=Mode.SUBTRACT)


solid = part.part
